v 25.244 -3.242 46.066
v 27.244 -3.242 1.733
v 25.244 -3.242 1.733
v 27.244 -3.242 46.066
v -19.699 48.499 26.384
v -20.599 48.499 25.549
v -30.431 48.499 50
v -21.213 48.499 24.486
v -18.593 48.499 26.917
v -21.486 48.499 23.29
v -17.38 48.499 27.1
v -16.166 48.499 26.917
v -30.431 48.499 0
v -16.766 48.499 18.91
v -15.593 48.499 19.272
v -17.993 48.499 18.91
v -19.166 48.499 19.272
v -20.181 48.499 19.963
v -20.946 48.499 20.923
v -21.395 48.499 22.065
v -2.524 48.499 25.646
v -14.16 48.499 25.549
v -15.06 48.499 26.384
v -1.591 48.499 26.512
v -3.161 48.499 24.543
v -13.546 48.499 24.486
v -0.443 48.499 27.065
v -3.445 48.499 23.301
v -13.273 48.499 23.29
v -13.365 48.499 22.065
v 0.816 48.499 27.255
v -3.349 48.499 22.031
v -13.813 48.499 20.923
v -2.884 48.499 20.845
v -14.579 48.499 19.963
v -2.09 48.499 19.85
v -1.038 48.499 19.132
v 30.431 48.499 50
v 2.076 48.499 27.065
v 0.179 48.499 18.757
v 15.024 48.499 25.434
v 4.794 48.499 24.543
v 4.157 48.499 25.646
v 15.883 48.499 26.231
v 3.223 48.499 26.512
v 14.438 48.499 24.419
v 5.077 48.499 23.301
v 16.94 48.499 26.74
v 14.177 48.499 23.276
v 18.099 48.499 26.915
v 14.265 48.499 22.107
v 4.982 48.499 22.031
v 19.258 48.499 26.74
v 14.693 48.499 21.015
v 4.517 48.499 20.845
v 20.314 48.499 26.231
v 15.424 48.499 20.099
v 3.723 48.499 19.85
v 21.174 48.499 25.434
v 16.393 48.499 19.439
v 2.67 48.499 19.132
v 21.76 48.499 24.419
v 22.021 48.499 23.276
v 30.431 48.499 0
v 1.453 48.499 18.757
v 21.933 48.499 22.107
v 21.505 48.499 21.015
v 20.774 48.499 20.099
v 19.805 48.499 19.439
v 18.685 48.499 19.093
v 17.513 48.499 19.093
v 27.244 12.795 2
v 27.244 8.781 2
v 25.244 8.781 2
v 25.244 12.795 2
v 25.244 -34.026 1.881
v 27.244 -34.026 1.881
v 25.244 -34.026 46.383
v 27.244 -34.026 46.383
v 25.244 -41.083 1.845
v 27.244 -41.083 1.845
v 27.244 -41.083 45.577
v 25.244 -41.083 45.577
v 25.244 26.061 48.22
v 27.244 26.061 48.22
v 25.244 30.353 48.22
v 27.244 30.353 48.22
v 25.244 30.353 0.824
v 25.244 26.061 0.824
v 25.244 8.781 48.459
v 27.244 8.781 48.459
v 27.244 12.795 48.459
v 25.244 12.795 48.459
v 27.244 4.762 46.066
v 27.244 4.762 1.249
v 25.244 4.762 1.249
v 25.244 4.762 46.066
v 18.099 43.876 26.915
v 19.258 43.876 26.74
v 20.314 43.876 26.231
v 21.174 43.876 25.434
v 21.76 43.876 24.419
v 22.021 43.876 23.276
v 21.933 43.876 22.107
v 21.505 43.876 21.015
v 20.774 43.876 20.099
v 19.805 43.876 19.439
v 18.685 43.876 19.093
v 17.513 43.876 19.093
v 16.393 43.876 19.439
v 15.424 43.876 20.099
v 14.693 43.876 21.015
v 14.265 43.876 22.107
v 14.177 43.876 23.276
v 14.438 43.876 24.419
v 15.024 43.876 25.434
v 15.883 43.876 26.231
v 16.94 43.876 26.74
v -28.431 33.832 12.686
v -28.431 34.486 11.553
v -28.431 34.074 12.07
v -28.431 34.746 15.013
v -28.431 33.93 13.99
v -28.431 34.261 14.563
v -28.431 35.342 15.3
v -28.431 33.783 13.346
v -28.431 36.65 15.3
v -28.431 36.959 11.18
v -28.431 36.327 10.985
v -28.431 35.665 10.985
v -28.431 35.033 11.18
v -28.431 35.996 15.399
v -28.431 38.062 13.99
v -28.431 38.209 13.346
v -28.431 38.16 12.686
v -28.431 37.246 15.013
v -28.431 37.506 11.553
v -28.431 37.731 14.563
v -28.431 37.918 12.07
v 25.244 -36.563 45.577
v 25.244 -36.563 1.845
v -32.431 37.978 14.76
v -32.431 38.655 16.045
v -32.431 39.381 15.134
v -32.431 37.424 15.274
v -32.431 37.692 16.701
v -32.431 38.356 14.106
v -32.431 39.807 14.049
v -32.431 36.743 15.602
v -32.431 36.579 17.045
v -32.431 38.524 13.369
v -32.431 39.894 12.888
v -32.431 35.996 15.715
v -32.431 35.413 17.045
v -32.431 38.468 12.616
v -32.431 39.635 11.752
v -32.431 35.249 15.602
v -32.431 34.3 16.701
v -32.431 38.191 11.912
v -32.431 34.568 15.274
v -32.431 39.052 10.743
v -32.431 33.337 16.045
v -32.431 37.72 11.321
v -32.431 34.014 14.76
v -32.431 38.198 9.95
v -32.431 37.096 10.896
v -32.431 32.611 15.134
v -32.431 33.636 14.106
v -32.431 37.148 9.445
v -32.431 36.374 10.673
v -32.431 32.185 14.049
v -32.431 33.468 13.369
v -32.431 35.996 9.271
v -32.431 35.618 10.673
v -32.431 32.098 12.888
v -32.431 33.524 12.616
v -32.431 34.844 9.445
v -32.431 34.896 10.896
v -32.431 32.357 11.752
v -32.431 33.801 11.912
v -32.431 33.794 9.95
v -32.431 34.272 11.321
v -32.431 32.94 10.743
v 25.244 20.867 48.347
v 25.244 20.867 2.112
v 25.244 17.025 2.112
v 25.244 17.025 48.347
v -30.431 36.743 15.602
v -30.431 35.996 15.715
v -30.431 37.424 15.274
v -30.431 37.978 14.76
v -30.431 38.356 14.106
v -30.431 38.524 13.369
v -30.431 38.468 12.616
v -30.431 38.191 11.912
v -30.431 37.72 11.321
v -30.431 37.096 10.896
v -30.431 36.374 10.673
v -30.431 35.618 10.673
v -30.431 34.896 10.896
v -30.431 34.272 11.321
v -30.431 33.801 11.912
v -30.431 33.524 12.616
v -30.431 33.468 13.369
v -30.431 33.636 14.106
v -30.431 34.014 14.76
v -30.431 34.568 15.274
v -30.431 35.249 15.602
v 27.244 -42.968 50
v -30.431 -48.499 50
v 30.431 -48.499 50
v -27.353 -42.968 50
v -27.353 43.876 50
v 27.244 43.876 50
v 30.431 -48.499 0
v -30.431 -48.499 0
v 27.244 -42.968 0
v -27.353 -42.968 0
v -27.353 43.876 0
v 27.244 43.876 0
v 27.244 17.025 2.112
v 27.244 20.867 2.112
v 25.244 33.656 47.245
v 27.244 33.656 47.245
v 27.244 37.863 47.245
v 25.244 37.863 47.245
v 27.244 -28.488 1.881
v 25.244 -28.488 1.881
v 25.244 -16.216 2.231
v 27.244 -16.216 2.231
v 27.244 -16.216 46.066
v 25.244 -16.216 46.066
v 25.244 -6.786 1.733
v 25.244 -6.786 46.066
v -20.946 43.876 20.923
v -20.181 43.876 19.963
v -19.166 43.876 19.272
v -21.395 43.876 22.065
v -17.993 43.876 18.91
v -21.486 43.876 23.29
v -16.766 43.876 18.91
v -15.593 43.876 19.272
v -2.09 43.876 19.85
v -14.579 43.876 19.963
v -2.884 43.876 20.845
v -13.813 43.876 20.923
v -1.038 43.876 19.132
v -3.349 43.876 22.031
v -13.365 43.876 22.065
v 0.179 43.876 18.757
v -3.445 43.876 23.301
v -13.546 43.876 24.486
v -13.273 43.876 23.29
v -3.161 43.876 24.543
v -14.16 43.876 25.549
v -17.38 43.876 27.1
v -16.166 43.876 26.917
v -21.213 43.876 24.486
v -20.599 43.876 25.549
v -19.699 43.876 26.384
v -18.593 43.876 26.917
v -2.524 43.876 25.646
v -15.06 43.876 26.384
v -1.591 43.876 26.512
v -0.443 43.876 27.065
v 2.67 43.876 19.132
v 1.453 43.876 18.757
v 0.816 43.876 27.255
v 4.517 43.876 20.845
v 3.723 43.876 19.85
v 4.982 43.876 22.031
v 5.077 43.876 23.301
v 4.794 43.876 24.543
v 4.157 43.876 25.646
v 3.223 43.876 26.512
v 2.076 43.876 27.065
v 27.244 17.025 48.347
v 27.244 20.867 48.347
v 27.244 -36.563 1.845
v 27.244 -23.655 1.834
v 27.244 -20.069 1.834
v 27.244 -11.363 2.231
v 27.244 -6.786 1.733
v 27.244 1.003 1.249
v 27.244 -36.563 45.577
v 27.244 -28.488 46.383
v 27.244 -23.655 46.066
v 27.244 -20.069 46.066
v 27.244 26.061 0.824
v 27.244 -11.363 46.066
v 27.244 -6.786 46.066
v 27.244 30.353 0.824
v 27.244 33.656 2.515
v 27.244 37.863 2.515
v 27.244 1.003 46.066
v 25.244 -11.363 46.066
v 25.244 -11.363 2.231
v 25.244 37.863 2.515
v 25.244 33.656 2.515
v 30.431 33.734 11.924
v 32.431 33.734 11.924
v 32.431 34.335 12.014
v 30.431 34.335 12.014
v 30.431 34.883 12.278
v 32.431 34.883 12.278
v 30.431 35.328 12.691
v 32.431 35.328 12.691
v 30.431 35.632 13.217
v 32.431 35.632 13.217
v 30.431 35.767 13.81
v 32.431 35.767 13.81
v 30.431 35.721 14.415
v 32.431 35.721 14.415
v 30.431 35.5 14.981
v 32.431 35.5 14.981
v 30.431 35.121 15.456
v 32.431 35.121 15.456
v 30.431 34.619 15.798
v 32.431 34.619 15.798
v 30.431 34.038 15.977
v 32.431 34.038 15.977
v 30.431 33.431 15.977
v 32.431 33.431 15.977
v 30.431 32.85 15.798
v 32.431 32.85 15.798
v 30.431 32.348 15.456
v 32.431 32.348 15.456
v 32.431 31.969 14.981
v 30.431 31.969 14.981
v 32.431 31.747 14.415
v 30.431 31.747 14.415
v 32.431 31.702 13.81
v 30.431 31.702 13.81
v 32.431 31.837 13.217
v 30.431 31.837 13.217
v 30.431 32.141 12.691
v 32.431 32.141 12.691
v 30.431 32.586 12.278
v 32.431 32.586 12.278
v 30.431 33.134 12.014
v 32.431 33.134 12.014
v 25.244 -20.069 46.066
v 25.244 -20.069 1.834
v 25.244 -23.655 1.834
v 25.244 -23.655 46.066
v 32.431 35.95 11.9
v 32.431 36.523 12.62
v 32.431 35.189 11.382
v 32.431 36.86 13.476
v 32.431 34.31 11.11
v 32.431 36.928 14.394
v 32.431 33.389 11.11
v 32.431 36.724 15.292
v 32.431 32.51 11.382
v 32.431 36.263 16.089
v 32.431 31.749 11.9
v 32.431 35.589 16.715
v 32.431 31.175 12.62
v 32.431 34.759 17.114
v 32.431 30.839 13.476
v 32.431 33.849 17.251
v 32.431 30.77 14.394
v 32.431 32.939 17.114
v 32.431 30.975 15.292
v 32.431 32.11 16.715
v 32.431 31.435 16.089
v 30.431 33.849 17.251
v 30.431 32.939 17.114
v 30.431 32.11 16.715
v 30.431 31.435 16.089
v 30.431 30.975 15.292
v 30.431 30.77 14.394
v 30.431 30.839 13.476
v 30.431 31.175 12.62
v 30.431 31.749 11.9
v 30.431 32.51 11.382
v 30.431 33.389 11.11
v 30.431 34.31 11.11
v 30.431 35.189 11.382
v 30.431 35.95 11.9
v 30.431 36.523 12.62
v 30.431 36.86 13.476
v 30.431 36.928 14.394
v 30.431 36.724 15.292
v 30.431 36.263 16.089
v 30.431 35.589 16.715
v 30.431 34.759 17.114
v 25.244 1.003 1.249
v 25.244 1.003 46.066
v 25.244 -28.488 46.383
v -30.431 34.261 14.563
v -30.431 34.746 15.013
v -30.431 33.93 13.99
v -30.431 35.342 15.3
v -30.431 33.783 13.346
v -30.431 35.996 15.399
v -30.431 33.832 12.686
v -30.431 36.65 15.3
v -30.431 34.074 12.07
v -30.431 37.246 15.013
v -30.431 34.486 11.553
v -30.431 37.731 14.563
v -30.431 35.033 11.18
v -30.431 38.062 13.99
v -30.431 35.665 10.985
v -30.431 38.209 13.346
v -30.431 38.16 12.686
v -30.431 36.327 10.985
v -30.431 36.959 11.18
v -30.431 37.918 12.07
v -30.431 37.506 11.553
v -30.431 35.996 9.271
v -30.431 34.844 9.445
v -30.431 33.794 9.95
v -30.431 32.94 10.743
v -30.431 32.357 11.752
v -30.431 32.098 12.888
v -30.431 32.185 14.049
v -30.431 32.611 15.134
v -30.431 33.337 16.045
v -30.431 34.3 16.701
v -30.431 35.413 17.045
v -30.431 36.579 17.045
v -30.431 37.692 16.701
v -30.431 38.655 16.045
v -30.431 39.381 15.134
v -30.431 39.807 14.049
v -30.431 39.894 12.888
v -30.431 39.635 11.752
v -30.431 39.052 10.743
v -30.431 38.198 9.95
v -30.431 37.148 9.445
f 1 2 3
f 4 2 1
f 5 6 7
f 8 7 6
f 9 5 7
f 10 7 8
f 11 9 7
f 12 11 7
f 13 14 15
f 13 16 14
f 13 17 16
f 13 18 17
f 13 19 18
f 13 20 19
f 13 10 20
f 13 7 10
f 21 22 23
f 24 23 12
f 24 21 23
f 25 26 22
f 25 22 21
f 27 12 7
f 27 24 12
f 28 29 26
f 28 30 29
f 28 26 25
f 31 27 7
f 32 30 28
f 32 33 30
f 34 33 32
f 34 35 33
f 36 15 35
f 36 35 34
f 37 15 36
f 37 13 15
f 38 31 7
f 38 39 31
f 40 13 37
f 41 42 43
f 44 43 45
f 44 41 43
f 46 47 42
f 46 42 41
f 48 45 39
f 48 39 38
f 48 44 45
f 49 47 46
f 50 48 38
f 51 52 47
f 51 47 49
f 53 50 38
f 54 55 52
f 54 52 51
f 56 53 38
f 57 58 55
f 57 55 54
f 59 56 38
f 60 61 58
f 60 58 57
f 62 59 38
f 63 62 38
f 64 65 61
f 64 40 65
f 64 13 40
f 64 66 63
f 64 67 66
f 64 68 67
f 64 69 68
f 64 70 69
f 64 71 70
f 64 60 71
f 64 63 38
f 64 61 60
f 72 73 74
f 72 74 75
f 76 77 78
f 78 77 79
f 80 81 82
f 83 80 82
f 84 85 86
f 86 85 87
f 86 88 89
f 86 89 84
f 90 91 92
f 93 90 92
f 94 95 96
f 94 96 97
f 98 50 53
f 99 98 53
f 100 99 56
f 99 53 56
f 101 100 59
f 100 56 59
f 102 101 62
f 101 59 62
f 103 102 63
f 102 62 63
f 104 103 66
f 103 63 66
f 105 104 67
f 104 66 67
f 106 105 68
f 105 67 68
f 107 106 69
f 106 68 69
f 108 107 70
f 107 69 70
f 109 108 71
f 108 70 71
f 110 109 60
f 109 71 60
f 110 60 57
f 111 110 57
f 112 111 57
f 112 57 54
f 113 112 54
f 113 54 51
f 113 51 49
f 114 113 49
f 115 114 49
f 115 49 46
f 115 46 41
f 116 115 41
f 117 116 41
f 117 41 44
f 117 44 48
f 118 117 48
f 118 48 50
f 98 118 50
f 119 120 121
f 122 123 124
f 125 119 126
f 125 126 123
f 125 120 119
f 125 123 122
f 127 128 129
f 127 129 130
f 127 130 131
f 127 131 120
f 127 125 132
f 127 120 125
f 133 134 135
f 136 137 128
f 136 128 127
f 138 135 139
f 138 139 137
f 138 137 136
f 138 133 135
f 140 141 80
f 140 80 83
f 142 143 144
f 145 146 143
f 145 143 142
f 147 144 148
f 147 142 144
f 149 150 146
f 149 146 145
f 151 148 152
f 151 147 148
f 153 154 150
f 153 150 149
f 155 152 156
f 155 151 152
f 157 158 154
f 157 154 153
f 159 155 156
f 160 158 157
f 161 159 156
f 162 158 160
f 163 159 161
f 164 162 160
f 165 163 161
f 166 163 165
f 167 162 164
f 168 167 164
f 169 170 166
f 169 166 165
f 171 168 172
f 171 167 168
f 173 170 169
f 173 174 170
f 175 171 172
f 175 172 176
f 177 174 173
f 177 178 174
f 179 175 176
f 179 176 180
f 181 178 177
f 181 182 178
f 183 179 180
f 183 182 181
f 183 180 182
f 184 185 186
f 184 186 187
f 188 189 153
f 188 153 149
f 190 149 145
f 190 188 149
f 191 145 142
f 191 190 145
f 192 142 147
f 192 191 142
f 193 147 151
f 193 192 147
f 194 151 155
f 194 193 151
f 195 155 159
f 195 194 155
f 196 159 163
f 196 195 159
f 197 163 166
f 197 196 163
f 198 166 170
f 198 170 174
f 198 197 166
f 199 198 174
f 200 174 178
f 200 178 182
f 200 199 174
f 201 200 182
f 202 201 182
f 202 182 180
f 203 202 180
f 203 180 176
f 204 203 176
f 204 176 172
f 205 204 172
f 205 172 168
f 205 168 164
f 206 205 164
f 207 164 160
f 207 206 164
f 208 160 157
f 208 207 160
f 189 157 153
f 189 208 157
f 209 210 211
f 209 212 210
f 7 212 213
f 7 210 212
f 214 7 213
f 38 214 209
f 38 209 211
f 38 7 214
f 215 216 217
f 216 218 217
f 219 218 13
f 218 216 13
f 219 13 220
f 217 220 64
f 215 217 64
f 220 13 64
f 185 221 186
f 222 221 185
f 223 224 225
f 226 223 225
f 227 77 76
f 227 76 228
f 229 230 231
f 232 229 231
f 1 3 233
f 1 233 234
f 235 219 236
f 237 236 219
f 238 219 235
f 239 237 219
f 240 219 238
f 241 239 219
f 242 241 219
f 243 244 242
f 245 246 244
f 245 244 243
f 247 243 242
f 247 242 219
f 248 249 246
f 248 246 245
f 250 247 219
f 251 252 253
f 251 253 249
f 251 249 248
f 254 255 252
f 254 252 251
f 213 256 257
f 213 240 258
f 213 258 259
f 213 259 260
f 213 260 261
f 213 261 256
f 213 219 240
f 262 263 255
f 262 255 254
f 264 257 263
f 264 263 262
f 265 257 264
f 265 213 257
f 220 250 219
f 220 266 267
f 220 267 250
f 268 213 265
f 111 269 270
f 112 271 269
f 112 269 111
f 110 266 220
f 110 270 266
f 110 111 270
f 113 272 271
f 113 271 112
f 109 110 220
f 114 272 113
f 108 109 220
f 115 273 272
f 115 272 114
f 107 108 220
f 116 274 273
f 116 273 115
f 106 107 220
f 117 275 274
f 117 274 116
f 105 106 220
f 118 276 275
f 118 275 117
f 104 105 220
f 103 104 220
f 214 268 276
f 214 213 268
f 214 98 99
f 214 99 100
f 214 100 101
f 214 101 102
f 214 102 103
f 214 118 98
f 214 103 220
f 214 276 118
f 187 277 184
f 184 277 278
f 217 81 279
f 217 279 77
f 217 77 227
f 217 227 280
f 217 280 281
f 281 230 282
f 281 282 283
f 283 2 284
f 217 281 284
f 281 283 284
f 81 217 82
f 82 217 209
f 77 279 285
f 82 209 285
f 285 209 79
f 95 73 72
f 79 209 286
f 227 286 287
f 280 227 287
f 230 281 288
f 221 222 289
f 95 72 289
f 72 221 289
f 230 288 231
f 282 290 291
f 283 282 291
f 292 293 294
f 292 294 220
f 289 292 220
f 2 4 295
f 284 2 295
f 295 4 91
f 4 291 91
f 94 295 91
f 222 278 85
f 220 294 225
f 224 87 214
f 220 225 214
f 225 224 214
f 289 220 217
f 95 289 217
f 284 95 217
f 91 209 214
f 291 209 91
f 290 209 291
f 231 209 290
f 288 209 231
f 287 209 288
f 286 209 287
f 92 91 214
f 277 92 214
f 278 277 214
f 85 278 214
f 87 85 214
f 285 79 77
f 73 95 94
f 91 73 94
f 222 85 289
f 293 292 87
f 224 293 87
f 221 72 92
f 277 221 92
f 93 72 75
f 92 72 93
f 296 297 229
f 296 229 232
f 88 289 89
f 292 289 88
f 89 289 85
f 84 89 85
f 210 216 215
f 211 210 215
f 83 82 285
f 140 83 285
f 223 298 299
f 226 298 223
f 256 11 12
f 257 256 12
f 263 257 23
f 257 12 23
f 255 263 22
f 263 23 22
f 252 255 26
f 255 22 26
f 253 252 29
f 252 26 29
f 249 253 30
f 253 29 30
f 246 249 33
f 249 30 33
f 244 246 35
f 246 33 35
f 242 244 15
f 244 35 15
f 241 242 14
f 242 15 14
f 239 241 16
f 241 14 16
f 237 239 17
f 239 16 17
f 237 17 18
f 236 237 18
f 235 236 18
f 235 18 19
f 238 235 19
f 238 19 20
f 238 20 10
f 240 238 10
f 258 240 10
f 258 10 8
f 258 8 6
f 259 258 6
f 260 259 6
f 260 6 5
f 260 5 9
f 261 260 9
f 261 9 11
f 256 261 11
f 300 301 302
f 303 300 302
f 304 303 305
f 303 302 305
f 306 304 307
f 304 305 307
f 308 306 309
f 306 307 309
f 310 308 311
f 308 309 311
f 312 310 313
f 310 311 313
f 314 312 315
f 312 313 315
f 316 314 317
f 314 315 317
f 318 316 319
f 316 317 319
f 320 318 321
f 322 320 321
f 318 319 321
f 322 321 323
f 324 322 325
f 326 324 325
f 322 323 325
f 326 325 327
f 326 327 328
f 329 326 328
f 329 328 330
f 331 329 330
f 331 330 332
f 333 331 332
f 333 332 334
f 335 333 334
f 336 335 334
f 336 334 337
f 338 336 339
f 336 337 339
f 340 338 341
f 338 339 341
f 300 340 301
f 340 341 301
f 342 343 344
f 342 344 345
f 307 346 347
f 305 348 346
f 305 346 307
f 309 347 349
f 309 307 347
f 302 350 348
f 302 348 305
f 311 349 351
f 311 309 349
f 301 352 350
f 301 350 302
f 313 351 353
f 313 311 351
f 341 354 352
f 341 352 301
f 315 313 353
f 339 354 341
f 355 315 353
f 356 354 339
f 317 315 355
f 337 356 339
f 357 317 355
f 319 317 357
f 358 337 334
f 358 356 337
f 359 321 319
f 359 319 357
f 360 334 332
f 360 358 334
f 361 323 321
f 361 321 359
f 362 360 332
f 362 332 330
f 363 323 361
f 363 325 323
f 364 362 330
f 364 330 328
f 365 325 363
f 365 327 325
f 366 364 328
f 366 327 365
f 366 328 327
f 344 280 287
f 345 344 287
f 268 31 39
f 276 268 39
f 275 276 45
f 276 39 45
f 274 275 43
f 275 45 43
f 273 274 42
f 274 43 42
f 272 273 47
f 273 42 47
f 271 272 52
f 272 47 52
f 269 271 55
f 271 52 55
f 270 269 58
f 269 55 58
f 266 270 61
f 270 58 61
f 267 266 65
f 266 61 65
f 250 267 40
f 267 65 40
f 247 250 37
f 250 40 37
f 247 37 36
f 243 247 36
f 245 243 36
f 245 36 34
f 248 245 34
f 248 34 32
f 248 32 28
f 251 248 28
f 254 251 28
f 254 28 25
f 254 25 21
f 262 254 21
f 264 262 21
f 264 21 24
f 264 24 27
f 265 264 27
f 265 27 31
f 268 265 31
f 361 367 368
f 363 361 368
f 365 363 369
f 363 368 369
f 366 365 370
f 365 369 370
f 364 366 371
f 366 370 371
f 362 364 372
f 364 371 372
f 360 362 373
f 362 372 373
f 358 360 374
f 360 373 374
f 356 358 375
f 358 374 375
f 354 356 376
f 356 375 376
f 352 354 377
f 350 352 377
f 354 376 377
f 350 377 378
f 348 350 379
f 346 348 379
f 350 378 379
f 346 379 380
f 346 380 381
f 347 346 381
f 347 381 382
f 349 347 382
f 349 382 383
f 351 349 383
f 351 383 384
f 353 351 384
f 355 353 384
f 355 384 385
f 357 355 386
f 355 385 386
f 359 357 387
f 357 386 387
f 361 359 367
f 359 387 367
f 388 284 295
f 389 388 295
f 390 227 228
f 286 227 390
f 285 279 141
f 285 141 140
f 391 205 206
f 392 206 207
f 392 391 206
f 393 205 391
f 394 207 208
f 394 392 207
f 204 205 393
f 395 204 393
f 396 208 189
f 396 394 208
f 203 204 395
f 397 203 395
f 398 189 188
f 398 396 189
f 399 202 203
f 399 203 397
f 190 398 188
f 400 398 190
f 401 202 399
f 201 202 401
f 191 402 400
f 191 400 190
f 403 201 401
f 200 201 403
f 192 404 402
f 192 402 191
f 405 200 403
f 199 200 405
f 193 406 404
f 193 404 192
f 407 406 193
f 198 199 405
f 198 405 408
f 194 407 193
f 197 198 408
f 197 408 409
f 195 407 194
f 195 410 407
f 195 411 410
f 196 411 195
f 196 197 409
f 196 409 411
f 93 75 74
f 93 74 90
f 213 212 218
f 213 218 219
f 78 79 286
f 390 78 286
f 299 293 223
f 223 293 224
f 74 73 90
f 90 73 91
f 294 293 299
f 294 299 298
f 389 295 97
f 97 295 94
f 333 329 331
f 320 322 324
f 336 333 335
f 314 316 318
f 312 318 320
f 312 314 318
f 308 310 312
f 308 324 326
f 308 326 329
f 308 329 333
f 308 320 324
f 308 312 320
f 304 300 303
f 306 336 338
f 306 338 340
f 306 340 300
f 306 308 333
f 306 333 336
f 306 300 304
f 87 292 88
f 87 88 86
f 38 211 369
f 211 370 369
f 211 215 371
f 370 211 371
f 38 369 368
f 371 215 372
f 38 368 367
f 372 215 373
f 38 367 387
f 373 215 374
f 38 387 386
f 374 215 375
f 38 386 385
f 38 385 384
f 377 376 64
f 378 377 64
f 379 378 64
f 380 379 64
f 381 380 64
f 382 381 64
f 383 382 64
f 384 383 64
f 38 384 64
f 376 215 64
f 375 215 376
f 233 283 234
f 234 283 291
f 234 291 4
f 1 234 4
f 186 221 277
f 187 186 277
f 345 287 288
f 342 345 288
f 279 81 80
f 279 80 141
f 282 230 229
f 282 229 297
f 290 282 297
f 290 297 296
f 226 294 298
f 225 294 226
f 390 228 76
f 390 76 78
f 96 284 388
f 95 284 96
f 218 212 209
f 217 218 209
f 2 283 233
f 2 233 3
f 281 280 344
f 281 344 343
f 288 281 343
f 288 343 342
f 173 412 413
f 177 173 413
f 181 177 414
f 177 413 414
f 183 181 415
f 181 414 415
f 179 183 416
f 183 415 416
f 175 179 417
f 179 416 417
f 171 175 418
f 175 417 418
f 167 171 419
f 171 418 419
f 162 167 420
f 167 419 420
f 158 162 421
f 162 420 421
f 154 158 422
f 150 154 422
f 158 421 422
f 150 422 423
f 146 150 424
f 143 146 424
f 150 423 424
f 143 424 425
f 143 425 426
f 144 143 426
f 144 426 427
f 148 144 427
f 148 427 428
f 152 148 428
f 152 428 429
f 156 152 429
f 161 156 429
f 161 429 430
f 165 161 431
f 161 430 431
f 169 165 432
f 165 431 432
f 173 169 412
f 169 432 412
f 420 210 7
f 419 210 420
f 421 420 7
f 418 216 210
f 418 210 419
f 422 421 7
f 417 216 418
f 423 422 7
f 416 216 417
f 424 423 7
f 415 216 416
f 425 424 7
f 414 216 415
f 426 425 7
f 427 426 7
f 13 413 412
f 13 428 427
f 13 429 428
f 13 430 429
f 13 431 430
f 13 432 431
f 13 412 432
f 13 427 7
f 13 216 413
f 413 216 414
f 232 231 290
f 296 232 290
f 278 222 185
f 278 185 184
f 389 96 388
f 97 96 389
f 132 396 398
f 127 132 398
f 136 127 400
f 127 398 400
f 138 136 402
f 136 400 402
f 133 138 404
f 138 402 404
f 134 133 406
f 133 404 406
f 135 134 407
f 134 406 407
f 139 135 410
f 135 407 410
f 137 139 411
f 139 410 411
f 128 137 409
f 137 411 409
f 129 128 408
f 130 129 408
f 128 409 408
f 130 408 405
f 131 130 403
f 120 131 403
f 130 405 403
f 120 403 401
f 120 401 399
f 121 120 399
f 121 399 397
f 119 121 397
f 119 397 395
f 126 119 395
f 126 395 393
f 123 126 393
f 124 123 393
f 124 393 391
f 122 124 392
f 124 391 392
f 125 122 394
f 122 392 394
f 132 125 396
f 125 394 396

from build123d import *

# Parameters (mm, degrees)
SKETCH1_W           = 60.861702088
SKETCH1_H           = 96.997143498
BOSS_EXTRUDE1_DEPTH = 50
SKETCH2_W           = 54.597089422
SKETCH2_H           = 86.84373193
CUT_EXTRUDE1_DEPTH  = 50
SKETCH3_R           = 4.118180668
SKETCH3_R_2         = 4.272844434
SKETCH3_R_3         = 3.932739474
CUT_EXTRUDE2_DEPTH  = 6
SKETCH4_R           = 3.08771087
BOSS_EXTRUDE2_DEPTH = 2
SKETCH5_R           = 2.038212953
CUT_EXTRUDE3_DEPTH  = 2
SKETCH6_R           = 3.908744467
SKETCH6_R_2         = 2.535125685
BOSS_EXTRUDE3_DEPTH = 2
SKETCH7_R           = 2.219432532
CUT_EXTRUDE4_DEPTH  = 2
SKETCH8_W           = 47.395397398
SKETCH8_H           = 4.29160036
SKETCH8_W_2         = 46.234961005
SKETCH8_H_2         = 3.842331126
SKETCH8_W_3         = 46.458453643
SKETCH8_H_3         = 4.013838195
SKETCH8_W_4         = 44.816524007
SKETCH8_H_4         = 3.759016324
SKETCH8_W_5         = 44.332896866
SKETCH8_H_5         = 3.544111845
SKETCH8_W_6         = 43.835439371
SKETCH8_H_6         = 4.852900567
SKETCH8_W_7         = 44.232019009
SKETCH8_H_7         = 3.586032373
SKETCH8_W_8         = 44.502323157
SKETCH8_H_8         = 5.537324529
BOSS_EXTRUDE4_DEPTH = 2
SKETCH9_W           = 44.730161392
SKETCH9_H           = 4.206770637
SKETCH9_W_2         = 43.731962655
SKETCH9_H_2         = 4.51977805
BOSS_EXTRUDE5_DEPTH = 2


with BuildPart() as part:
    # Sketch1 → Boss-Extrude1 (new body)
    with BuildSketch(Plane.XY):
        Rectangle(SKETCH1_W, SKETCH1_H)
    extrude(amount=BOSS_EXTRUDE1_DEPTH)

    # Sketch2 → Cut-Extrude1 (cut)
    with BuildSketch(Plane.XY.offset(50)):
        with Locations((-0.054476232, 0.453696841)):
            Rectangle(SKETCH2_W, SKETCH2_H)
    extrude(amount=-CUT_EXTRUDE1_DEPTH, mode=Mode.SUBTRACT)

    # Sketch3 → Cut-Extrude2 (cut)
    with BuildSketch(Plane(origin=(0, 48.498571749, 0), x_dir=(1, 0, 0), z_dir=(0, 1, 0))):
        with Locations(Location((-17.379612091, -22.981855157, 0), (0, 0, 270))):
            Circle(SKETCH3_R)
        with Locations(Location((0.816264726, -22.981855157, 0), (0, 0, 270))):
            Circle(SKETCH3_R_2)
        with Locations(Location((18.098885302, -22.981855157, 0), (0, 0, 270))):
            Circle(SKETCH3_R_3)
    extrude(amount=-CUT_EXTRUDE2_DEPTH, mode=Mode.SUBTRACT)

    # Sketch4 → Boss-Extrude2 (add)
    with BuildSketch(Plane(origin=(30.430851044, 0, 0), x_dir=(0, 0, -1), z_dir=(1, 0, 0))):
        with Locations(Location((-14.163441472, 33.849346779, 0), (0, 0, 180))):
            Circle(SKETCH4_R)
    extrude(amount=BOSS_EXTRUDE2_DEPTH)

    # Sketch5 → Cut-Extrude3 (cut)
    with BuildSketch(Plane(origin=(32.430851044, 0, 0), x_dir=(0, 0, -1), z_dir=(1, 0, 0))):
        with Locations((-13.96185256, 33.734367255)):
            Circle(SKETCH5_R)
    extrude(amount=-CUT_EXTRUDE3_DEPTH, mode=Mode.SUBTRACT)

    # Sketch6 → Boss-Extrude3 (add)
    with BuildSketch(Plane.ZY.offset(30.430851044)):
        with Locations(Location((13.179644946, 35.995992558, 0), (0, 0, 180))):
            Circle(SKETCH6_R)
        with Locations((13.179644946, 35.995992558)):
            Circle(SKETCH6_R_2, mode=Mode.SUBTRACT)
    extrude(amount=BOSS_EXTRUDE3_DEPTH)

    # Sketch7 → Cut-Extrude4 (cut)
    with BuildSketch(Plane.ZY.offset(30.430851044)):
        with Locations((13.179644946, 35.995992558)):
            Circle(SKETCH7_R)
    extrude(amount=-CUT_EXTRUDE4_DEPTH, mode=Mode.SUBTRACT)

    # Sketch8 → Boss-Extrude4 (add)
    with BuildSketch(Plane.ZY.offset(-27.244068479)):
        with Locations((24.521897503, 28.206728859)):
            Rectangle(SKETCH8_W, SKETCH8_H)
        with Locations((25.229689805, 18.94599963)):
            Rectangle(SKETCH8_W_2, SKETCH8_H_2)
        with Locations((25.229689805, 10.788271288)):
            Rectangle(SKETCH8_W_3, SKETCH8_H_3)
        with Locations((23.657759327, 2.882970932)):
            Rectangle(SKETCH8_W_4, SKETCH8_H_4)
        with Locations((23.899572897, -5.013591611)):
            Rectangle(SKETCH8_W_5, SKETCH8_H_5)
        with Locations((24.148301645, -13.789703554)):
            Rectangle(SKETCH8_W_6, SKETCH8_H_6)
        with Locations((23.950011826, -21.862272303)):
            Rectangle(SKETCH8_W_7, SKETCH8_H_7)
        with Locations((24.1320976, -31.257152078)):
            Rectangle(SKETCH8_W_8, SKETCH8_H_8)
    extrude(amount=BOSS_EXTRUDE4_DEPTH)

    # Sketch9 → Boss-Extrude5 (add)
    with BuildSketch(Plane.ZY.offset(-27.244068479)):
        with Locations((24.880043499, 35.759572617)):
            Rectangle(SKETCH9_W, SKETCH9_H)
        with Locations((23.711117662, -38.822738944)):
            Rectangle(SKETCH9_W_2, SKETCH9_H_2)
    extrude(amount=BOSS_EXTRUDE5_DEPTH)


solid = part.part
